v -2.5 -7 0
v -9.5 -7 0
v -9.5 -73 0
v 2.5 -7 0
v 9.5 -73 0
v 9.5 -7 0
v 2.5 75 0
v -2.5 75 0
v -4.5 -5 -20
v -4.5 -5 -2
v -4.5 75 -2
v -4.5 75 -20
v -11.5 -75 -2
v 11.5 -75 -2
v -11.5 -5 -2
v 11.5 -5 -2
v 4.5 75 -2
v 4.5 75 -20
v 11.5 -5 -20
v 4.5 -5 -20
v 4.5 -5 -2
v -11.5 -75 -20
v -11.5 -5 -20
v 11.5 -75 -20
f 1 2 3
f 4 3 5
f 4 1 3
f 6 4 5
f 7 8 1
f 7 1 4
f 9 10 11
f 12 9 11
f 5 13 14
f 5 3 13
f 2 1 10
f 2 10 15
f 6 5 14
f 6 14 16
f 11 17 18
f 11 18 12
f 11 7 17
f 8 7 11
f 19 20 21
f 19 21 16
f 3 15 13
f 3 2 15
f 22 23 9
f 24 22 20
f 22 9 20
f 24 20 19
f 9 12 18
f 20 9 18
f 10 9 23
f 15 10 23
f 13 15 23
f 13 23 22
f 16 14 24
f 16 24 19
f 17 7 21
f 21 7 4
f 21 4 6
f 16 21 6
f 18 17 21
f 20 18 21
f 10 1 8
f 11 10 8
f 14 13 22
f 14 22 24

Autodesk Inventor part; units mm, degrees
ref_plane "YZ Plane" through (0, 0, 0) normal (1, 0, 0) x (0, 1, 0)
ref_plane "XZ Plane" through (0, 0, 0) normal (0, 1, 0) x (-1, 0, 0)
ref_plane "XY Plane" through (0, 0, 0) normal (0, 0, 1) x (1, 0, 0)
sketch "Sketch1" plane through (0, 0, 0) normal (0, 0, 1) x (1, 0, 0)
  line L0 (-11.5, -75) -> (11.5, -75)
  line L1 (11.5, -75) -> (11.5, 75)
  line L2 (11.5, 75) -> (-11.5, 75)
  line L3 (-11.5, 75) -> (-11.5, -75)
  line L4 (-11.5, -75) -> (11.5, 75) construction
  line L5 (11.5, -75) -> (-11.5, 75) construction
  line L6 (-4.5, 75) -> (4.5, 75)
  line L7 (4.5, 75) -> (4.5, -5)
  line L8 (4.5, -5) -> (-4.5, -5) construction
  line L9 (-4.5, -5) -> (-4.5, 75)
  line L10 (0, -75) -> (0, 75) construction
  line L11 (-4.5, -5) -> (-11.5, -5)
  line L12 (4.5, -5) -> (11.5, -5)
  point P0 (0, 0)
  dimension "d0" = 150
  dimension "d1" = 80
  dimension "d2" = 7
  dimension "d3" = 23
extrude "Extrusion1" add sketch "Sketch1" against normal blind 20 contours L3 L11 L9 L2 L7 L12 L1 L0
chamfer "Chamfer1" distance 2 angle 45 7 edges at (0, -75, 0) (-11.5, -40, 0) (11.5, -40, 0) (8, -5, 0) (-8, -5, 0) (-4.5, 35, 0) (4.5, 35, 0)
equation "\"d0\" = key_length"
equation "\"d1\" = blackkey_length"
equation "\"d2\" = blackkey_halfwidth"
equation "\"d3\" = key_width"
equation "\"d4\" = key_height"
equation "\"key_length\" = 150"
equation "\"blackkey_length\" = 80"
equation "\"blackkey_halfwidth\" = 7"
equation "\"key_width\" = 23"
equation "\"key_height\" = 20"
properties part number "key_3"
